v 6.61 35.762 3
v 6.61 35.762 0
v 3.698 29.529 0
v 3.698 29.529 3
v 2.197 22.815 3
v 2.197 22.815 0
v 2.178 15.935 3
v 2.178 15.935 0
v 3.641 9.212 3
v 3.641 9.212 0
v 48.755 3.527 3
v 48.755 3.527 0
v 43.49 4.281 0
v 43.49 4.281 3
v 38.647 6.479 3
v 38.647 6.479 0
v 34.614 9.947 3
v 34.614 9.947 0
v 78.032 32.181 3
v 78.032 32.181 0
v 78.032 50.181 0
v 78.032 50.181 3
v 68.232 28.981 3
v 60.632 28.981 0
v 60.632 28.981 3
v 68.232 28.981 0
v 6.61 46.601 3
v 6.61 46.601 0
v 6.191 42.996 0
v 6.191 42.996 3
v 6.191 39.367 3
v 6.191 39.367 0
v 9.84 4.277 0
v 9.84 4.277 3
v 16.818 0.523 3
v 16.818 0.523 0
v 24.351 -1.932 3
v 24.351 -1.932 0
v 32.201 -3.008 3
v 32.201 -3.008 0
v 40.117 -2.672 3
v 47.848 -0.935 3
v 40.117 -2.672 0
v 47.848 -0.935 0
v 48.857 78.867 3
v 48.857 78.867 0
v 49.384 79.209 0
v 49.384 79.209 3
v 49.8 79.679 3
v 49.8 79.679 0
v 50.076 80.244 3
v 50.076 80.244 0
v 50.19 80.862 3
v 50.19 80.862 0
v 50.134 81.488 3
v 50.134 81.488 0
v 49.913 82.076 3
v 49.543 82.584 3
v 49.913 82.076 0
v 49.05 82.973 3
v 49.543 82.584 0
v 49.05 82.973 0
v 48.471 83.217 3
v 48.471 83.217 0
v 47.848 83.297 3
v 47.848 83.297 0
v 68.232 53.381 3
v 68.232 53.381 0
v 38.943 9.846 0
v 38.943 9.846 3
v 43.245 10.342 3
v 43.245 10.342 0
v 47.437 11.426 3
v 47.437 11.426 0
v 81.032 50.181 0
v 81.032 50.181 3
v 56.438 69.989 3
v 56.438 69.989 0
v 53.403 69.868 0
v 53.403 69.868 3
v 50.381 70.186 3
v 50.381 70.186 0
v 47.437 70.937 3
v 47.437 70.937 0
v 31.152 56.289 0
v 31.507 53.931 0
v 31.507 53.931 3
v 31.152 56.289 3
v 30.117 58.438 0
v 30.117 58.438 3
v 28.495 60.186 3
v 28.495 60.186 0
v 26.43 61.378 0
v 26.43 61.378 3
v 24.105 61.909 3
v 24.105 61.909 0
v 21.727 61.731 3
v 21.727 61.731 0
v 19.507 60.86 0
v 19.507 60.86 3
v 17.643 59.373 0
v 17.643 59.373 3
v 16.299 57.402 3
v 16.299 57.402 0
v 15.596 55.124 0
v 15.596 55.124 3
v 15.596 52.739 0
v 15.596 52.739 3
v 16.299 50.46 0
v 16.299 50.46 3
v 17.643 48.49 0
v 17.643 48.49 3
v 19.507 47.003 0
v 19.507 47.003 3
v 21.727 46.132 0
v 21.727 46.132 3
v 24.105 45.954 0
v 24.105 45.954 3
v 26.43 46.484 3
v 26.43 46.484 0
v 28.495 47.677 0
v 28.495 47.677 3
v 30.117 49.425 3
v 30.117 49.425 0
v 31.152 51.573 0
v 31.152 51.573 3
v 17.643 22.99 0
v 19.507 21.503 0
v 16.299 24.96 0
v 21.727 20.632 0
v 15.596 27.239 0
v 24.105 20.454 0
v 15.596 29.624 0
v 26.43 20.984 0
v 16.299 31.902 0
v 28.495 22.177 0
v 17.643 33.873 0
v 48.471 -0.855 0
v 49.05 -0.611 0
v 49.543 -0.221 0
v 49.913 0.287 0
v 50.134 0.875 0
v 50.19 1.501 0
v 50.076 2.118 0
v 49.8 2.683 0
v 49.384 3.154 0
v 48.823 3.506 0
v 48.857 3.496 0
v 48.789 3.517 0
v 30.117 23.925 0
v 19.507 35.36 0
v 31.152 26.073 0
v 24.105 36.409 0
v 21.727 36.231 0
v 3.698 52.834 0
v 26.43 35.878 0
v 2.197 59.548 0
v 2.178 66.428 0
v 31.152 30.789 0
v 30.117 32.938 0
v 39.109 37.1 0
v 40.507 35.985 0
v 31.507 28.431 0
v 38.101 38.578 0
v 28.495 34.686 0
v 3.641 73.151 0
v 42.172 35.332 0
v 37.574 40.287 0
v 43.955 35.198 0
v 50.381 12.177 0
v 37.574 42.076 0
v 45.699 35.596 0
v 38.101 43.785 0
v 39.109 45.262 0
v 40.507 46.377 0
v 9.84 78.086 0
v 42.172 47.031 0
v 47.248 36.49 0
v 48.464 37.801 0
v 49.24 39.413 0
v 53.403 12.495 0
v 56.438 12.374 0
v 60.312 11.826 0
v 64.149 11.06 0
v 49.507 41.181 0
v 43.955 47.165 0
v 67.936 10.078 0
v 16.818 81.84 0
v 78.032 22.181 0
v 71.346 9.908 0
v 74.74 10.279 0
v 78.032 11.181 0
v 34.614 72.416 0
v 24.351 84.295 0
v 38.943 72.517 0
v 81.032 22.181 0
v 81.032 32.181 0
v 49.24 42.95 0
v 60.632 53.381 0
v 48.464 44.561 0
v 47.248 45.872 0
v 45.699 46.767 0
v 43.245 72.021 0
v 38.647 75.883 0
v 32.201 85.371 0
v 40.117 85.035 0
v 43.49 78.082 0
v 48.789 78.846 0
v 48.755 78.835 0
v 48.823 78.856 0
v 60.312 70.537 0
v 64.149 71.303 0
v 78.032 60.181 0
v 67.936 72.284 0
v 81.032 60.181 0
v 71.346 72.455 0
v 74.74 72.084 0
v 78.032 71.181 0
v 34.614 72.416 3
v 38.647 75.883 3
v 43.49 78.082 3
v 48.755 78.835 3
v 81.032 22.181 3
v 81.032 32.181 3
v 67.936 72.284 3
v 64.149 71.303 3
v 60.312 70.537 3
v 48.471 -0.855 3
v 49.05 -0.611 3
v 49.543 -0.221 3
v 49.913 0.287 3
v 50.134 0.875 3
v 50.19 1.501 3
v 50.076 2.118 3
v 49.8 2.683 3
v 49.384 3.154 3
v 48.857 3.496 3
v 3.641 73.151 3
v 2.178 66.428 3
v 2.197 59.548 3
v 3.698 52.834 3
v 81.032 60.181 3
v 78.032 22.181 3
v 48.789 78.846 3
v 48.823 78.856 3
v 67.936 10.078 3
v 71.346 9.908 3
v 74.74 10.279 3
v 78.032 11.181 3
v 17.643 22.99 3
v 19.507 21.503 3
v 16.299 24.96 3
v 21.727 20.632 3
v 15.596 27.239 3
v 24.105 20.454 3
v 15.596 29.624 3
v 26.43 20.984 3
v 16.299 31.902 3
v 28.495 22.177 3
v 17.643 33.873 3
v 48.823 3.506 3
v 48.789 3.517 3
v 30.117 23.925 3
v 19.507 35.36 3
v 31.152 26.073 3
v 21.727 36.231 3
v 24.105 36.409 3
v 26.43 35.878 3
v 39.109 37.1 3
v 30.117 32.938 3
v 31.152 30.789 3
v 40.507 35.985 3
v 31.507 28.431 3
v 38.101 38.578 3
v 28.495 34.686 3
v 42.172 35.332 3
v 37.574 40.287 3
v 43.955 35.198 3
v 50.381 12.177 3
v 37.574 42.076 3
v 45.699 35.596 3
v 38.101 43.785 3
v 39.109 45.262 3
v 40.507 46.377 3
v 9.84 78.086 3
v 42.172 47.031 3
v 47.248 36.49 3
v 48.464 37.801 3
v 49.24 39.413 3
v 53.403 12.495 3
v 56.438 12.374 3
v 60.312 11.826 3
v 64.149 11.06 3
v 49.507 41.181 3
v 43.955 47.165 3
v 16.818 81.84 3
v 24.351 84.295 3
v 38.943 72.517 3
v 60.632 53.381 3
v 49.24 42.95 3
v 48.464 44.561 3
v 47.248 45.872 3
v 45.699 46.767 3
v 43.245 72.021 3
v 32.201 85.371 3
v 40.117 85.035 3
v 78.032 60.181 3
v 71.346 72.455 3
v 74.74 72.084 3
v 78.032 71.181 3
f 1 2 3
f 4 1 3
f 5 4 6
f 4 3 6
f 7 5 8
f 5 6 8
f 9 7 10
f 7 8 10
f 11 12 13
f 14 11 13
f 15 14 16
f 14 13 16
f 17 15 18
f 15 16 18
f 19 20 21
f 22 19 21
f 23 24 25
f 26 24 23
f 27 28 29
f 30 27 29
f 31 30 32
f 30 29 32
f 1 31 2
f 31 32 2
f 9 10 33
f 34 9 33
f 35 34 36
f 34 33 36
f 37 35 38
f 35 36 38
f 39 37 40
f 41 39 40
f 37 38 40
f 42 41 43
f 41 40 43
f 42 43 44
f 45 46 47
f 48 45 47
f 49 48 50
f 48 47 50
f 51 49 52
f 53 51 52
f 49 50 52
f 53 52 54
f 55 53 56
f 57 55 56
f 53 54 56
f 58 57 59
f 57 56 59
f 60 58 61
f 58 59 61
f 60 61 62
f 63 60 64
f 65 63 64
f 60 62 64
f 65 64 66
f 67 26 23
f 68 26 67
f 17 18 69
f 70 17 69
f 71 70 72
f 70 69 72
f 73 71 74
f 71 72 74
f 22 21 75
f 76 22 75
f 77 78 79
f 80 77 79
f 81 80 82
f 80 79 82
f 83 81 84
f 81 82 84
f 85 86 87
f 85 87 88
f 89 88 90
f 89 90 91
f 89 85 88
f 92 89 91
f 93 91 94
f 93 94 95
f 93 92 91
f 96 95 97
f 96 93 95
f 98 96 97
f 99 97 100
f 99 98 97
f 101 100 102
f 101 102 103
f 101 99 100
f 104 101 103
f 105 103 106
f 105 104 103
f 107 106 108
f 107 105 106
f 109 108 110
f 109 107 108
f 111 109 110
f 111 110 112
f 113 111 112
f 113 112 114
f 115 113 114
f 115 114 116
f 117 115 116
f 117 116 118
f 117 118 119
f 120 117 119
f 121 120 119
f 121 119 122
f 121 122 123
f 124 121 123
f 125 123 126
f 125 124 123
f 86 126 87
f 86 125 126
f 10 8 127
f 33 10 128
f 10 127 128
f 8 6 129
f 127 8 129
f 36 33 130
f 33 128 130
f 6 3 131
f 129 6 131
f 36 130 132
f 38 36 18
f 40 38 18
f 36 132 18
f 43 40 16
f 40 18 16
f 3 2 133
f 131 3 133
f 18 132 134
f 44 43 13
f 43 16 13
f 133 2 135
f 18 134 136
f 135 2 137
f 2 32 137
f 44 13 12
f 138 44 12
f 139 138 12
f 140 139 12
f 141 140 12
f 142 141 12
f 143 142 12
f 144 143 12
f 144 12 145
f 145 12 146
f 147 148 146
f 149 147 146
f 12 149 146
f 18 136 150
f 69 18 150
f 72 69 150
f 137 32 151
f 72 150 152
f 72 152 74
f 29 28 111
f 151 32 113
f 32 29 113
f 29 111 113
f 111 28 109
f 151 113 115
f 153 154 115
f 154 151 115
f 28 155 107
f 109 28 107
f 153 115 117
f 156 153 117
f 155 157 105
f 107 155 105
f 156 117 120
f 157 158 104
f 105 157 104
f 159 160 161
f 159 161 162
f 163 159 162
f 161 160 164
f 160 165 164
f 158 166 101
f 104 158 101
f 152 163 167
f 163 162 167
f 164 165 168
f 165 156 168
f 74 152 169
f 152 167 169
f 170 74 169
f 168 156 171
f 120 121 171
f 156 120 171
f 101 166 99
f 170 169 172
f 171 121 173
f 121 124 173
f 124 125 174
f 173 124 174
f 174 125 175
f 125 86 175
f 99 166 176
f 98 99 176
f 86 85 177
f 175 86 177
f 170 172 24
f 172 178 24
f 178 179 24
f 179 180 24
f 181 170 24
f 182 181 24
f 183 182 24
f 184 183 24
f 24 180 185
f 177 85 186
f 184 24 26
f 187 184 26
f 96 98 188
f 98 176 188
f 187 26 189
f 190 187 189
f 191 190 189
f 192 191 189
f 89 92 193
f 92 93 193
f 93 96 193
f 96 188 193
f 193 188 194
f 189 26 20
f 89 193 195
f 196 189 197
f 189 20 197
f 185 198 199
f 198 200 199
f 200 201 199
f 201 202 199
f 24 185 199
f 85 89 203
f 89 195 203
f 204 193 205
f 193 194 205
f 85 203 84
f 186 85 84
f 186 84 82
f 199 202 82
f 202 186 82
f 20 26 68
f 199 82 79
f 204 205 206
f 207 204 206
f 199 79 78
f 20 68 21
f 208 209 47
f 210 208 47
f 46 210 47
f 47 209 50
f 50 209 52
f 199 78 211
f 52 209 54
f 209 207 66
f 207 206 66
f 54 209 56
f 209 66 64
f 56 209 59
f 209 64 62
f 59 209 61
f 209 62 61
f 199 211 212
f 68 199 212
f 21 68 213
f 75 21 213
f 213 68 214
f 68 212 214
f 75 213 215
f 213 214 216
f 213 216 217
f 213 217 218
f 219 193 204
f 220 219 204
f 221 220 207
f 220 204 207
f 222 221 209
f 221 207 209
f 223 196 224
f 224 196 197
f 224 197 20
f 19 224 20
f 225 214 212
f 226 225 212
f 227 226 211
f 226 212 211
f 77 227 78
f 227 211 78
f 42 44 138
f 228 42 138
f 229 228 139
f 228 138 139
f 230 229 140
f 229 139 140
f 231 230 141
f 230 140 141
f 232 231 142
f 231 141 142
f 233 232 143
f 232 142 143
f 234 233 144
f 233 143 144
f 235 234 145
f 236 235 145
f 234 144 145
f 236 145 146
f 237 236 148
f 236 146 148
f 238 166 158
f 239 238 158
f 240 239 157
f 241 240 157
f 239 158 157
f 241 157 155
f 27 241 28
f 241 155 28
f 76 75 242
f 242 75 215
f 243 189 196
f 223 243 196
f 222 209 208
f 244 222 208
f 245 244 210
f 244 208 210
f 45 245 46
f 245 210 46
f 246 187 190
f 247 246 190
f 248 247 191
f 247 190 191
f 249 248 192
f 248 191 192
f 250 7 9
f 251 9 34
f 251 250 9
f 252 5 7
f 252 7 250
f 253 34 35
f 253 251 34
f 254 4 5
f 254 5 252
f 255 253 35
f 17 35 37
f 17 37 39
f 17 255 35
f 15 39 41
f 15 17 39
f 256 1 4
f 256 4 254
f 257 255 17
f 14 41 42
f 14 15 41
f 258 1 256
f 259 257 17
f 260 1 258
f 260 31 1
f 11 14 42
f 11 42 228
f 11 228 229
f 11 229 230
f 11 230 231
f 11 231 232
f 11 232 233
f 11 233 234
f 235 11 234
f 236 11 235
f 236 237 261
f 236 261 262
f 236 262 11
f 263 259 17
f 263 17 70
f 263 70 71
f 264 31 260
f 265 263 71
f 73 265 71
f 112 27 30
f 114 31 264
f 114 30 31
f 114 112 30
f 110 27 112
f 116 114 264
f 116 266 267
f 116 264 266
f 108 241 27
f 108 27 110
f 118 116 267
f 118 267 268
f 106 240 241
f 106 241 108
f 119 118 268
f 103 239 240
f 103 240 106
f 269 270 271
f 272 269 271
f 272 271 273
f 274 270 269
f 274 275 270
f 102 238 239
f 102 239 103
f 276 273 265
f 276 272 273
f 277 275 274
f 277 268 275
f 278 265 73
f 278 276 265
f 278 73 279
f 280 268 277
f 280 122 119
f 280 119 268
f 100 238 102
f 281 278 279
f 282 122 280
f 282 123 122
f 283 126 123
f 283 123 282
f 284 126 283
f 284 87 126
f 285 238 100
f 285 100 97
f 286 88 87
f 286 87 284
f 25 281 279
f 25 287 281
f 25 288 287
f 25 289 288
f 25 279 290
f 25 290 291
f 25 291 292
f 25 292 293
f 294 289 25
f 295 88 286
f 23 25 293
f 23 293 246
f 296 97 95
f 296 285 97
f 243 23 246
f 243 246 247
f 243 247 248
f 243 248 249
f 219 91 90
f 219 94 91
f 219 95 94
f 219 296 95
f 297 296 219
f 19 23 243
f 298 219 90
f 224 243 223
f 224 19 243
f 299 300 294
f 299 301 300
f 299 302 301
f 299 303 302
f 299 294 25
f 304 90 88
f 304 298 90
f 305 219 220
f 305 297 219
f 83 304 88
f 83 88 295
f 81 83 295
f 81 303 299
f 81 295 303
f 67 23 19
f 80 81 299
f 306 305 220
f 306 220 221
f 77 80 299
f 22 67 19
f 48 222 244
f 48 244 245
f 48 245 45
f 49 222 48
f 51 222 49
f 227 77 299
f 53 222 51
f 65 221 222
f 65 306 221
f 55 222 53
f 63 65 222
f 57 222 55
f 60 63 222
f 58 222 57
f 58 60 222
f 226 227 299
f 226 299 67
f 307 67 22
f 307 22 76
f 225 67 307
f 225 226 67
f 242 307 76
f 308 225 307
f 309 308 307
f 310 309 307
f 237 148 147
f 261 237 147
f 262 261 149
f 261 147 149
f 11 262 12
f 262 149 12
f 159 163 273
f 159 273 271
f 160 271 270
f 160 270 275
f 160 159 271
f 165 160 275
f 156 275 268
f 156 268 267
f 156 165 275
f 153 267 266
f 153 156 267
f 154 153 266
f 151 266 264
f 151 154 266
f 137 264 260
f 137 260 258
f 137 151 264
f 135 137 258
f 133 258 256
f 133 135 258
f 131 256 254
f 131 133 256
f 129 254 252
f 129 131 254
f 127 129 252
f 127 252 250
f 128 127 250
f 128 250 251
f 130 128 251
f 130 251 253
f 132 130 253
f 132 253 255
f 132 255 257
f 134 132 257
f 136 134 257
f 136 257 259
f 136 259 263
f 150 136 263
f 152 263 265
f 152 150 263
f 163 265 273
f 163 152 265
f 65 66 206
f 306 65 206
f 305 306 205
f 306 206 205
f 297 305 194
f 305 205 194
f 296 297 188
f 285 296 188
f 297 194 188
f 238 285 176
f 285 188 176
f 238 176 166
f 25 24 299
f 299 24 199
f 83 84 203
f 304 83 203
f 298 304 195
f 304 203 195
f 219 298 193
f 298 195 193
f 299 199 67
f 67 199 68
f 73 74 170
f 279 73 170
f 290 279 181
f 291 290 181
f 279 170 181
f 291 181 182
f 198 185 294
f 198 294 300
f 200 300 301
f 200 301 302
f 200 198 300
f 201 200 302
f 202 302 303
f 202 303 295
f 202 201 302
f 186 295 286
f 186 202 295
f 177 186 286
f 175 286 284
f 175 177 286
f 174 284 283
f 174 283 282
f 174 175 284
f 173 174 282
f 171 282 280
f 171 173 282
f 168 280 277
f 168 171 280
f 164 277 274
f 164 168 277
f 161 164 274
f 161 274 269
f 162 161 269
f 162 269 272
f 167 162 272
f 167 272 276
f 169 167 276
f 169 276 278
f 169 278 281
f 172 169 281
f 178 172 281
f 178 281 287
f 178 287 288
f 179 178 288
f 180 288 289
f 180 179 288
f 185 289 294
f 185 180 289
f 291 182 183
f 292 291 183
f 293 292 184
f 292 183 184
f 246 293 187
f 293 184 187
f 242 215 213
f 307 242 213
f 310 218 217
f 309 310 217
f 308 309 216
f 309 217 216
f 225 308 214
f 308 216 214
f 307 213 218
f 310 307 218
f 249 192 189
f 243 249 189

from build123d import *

# Parameters (mm, degrees)
SKETCH2_R           = 8
SKETCH2_R_2         = 6
SKETCH2_W           = 7.6
SKETCH2_H           = 24.4
BOSS_EXTRUDE1_DEPTH = 3


with BuildPart() as part:
    # Sketch2 → Boss-Extrude1 (new body)
    with BuildSketch(Plane.XY):
        with BuildLine():
            Line((81.032103119, 50.181312), (81.032103119, 60.181312))
            Line((81.032103119, 60.181312), (78.032103119, 60.181312))
            Line((78.032103119, 60.181312), (78.032103119, 71.181312))
            ThreePointArc((78.032103119, 71.181312), (73.050090858, 72.33654353), (67.936161846, 72.284235691))
            ThreePointArc((67.936161846, 72.284235691), (62.235942644, 70.892785416), (56.438402104, 69.988818319))
            ThreePointArc((56.438402104, 69.988818319), (51.886102873, 69.971964975), (47.437133801, 70.93653043))
            ThreePointArc((47.437133801, 70.93653043), (41.102316828, 72.343050119), (34.613643935, 72.416041905))
            ThreePointArc((34.613643935, 72.416041905), (40.990344282, 77.154811793), (48.755286163, 78.83526559))
            ThreePointArc((48.755286163, 78.83526559), (48.80614848, 78.851120911), (48.85704212, 78.866875402))
            ThreePointArc((48.85704212, 78.866875402), (50.134187725, 81.487874692), (47.847872498, 83.297156554))
            ThreePointArc((47.847872498, 83.297156554), (24.351235249, 84.294658733), (3.641458375, 73.150507154))
            ThreePointArc((3.641458375, 73.150507154), (2.19654611, 59.548103084), (6.61028157, 46.600821237))
            ThreePointArc((6.61028157, 46.600821237), (6.138572184, 41.181312), (6.61028157, 35.761802763))
            ThreePointArc((6.61028157, 35.761802763), (2.19654611, 22.814520916), (3.641458375, 9.212116846))
            ThreePointArc((3.641458375, 9.212116846), (24.351235249, -1.932034733), (47.847872498, -0.934532554))
            ThreePointArc((47.847872498, -0.934532554), (50.134187725, 0.874749308), (48.85704212, 3.495748598))
            ThreePointArc((48.85704212, 3.495748598), (48.80614848, 3.511503089), (48.755286163, 3.52735841))
            ThreePointArc((48.755286163, 3.52735841), (40.990344282, 5.207812207), (34.613643935, 9.946582095))
            ThreePointArc((34.613643935, 9.946582095), (41.102316828, 10.019573881), (47.437133801, 11.42609357))
            ThreePointArc((47.437133801, 11.42609357), (51.886102873, 12.390659025), (56.438402104, 12.373805681))
            ThreePointArc((56.438402104, 12.373805681), (62.235942644, 11.469838584), (67.936161846, 10.078388309))
            ThreePointArc((67.936161846, 10.078388309), (73.050090858, 10.02608047), (78.032103119, 11.181312))
            Line((78.032103119, 11.181312), (78.032103119, 22.181312))
            Line((78.032103119, 22.181312), (81.032103119, 22.181312))
            Line((81.032103119, 22.181312), (81.032103119, 32.181312))
            Line((81.032103119, 32.181312), (78.032103119, 32.181312))
            Line((78.032103119, 32.181312), (78.032103119, 50.181312))
            Line((78.032103119, 50.181312), (81.032103119, 50.181312))
        make_face()
        with Locations((23.507028058, 53.931312)):
            Circle(SKETCH2_R, mode=Mode.SUBTRACT)
        with Locations((43.507028058, 41.181312)):
            Circle(SKETCH2_R_2, mode=Mode.SUBTRACT)
        with Locations((23.507028058, 28.431312)):
            Circle(SKETCH2_R, mode=Mode.SUBTRACT)
        with Locations((64.432028058, 41.181312)):
            Rectangle(SKETCH2_W, SKETCH2_H, mode=Mode.SUBTRACT)
    extrude(amount=BOSS_EXTRUDE1_DEPTH)


solid = part.part
